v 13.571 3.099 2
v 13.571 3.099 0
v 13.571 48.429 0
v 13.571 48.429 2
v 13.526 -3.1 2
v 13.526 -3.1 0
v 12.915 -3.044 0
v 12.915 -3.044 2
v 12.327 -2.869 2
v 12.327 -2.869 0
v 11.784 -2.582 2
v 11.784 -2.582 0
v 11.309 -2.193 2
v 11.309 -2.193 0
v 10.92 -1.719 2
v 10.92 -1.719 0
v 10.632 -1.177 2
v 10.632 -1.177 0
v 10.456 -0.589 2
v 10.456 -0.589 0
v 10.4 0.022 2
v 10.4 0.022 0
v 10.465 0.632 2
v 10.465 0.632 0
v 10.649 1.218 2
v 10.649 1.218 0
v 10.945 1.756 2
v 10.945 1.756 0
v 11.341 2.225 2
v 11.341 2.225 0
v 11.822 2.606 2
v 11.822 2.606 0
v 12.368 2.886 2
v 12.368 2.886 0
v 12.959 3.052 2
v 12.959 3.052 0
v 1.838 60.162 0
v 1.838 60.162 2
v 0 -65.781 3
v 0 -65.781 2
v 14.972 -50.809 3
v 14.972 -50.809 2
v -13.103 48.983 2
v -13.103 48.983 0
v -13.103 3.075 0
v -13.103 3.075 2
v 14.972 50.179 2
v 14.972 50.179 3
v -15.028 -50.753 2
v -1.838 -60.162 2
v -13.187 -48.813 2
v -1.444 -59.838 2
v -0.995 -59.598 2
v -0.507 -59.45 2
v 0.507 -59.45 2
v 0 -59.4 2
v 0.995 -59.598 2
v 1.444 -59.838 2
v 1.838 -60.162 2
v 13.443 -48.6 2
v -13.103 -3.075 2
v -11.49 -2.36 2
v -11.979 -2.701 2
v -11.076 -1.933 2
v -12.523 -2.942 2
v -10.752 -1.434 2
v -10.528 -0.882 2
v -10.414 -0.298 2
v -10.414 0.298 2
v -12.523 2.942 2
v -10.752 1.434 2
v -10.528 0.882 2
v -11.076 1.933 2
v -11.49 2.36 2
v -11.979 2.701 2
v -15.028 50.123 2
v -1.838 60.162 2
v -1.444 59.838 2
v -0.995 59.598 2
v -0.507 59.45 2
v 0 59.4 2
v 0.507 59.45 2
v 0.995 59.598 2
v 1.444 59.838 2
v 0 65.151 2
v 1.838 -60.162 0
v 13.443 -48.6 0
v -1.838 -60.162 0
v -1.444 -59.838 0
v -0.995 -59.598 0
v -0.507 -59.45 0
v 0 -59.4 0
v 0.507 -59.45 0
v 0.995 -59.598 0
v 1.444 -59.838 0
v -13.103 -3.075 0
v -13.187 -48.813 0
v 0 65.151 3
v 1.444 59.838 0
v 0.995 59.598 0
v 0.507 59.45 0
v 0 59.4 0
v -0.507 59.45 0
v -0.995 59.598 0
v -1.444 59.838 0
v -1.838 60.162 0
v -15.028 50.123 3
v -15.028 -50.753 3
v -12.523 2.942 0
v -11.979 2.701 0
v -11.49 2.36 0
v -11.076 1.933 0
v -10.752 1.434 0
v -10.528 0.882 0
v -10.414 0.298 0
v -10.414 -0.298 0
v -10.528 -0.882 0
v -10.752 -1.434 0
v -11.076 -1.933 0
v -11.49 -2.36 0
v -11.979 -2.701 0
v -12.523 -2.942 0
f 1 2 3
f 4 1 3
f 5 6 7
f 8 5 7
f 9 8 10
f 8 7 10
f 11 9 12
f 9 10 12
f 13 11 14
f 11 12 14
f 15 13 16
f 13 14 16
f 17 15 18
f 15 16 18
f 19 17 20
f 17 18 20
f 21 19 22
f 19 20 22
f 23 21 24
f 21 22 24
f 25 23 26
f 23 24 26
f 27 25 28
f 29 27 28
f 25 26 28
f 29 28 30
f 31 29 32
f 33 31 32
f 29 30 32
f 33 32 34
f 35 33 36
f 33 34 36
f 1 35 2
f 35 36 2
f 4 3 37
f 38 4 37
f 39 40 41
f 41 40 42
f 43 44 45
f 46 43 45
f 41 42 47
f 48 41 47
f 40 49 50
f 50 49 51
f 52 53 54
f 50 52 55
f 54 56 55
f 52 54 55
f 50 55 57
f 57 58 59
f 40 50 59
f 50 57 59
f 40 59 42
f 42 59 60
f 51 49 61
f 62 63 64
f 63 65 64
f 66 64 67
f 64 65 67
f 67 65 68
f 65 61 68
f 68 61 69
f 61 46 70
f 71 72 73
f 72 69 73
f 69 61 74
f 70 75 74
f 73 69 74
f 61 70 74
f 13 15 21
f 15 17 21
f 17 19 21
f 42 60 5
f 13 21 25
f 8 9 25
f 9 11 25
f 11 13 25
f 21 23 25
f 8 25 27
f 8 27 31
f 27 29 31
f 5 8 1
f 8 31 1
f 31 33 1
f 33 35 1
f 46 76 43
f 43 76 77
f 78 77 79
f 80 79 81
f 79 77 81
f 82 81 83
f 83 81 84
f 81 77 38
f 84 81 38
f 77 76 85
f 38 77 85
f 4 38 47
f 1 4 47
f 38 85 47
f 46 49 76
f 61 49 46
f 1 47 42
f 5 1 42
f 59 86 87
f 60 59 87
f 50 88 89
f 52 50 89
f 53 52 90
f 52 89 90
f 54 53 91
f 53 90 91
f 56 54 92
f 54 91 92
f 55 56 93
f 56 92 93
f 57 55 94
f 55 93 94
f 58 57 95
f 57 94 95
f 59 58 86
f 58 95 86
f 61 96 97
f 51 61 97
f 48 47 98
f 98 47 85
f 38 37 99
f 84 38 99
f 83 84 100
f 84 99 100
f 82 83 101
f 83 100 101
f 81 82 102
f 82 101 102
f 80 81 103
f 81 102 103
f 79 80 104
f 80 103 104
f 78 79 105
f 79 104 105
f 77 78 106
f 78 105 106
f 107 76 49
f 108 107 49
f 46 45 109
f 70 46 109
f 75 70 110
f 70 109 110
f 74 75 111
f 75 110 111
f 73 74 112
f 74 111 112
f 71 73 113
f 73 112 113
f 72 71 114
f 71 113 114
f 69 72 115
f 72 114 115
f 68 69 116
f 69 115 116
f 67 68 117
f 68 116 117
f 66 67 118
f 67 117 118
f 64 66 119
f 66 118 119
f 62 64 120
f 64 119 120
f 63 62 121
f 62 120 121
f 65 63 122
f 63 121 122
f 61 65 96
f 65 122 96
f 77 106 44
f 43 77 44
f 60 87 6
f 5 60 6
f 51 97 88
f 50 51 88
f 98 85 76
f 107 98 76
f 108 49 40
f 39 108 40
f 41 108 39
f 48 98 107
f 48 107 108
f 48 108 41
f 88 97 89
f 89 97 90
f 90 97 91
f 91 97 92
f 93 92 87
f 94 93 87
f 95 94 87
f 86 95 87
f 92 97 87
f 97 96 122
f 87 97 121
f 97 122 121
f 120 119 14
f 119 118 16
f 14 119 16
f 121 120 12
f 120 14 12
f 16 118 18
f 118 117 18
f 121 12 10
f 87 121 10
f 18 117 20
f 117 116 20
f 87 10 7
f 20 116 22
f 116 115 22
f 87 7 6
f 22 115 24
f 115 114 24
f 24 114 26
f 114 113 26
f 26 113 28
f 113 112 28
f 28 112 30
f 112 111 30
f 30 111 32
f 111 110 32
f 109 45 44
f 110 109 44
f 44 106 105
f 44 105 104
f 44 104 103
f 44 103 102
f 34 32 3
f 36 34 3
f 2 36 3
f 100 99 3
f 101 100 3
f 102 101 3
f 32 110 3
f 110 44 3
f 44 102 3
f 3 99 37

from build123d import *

# Parameters (mm, degrees)
BOSS_EXTRU_1_DEPTH = 2
BOSS_EXTRU_2_DEPTH = 1


with BuildPart() as part:
    # Esquisse1 → Boss.-Extru.1 (new body)
    with BuildSketch(Plane.XY):
        with BuildLine():
            Line((-13.186835109, -48.813164891), (-1.838477631, -60.161522369))
            ThreePointArc((-1.838477631, -60.161522369), (0, -59.4), (1.838477631, -60.161522369))
            Line((1.838477631, -60.161522369), (13.443252333, -48.599927693))
            Line((13.443252333, -48.599927693), (13.526323228, -3.099888238))
            ThreePointArc((13.526323228, -3.099888238), (10.400079466, 0.022196444), (13.570710678, 3.099193443))
            Line((13.570710678, 3.099193443), (13.570710678, 48.429289322))
            Line((13.570710678, 48.429289322), (1.838477631, 60.161522369))
            ThreePointArc((1.838477631, 60.161522369), (0, 59.4), (-1.838477631, 60.161522369))
            Line((-1.838477631, 60.161522369), (-13.103328579, 48.983053521))
            Line((-13.103328579, 48.983053521), (-13.103328579, 3.074516512))
            ThreePointArc((-13.103328579, 3.074516512), (-10.4, 0), (-13.103328579, -3.074516512))
            Line((-13.103328579, -3.074516512), (-13.186835109, -48.813164891))
        make_face()
    extrude(amount=BOSS_EXTRU_1_DEPTH)

    # Esquisse2 → Boss.-Extru.2 (add)
    with BuildSketch(Plane.XY.offset(2)):
        Polygon((0, 65.151280821), (-15.028155385, 50.123125436), (-15.028155385, -50.75260641), (0, -65.780761795), (14.971844615, -50.80891718), (14.971844615, 50.179436206), align=None)
    extrude(amount=BOSS_EXTRU_2_DEPTH)


solid = part.part
